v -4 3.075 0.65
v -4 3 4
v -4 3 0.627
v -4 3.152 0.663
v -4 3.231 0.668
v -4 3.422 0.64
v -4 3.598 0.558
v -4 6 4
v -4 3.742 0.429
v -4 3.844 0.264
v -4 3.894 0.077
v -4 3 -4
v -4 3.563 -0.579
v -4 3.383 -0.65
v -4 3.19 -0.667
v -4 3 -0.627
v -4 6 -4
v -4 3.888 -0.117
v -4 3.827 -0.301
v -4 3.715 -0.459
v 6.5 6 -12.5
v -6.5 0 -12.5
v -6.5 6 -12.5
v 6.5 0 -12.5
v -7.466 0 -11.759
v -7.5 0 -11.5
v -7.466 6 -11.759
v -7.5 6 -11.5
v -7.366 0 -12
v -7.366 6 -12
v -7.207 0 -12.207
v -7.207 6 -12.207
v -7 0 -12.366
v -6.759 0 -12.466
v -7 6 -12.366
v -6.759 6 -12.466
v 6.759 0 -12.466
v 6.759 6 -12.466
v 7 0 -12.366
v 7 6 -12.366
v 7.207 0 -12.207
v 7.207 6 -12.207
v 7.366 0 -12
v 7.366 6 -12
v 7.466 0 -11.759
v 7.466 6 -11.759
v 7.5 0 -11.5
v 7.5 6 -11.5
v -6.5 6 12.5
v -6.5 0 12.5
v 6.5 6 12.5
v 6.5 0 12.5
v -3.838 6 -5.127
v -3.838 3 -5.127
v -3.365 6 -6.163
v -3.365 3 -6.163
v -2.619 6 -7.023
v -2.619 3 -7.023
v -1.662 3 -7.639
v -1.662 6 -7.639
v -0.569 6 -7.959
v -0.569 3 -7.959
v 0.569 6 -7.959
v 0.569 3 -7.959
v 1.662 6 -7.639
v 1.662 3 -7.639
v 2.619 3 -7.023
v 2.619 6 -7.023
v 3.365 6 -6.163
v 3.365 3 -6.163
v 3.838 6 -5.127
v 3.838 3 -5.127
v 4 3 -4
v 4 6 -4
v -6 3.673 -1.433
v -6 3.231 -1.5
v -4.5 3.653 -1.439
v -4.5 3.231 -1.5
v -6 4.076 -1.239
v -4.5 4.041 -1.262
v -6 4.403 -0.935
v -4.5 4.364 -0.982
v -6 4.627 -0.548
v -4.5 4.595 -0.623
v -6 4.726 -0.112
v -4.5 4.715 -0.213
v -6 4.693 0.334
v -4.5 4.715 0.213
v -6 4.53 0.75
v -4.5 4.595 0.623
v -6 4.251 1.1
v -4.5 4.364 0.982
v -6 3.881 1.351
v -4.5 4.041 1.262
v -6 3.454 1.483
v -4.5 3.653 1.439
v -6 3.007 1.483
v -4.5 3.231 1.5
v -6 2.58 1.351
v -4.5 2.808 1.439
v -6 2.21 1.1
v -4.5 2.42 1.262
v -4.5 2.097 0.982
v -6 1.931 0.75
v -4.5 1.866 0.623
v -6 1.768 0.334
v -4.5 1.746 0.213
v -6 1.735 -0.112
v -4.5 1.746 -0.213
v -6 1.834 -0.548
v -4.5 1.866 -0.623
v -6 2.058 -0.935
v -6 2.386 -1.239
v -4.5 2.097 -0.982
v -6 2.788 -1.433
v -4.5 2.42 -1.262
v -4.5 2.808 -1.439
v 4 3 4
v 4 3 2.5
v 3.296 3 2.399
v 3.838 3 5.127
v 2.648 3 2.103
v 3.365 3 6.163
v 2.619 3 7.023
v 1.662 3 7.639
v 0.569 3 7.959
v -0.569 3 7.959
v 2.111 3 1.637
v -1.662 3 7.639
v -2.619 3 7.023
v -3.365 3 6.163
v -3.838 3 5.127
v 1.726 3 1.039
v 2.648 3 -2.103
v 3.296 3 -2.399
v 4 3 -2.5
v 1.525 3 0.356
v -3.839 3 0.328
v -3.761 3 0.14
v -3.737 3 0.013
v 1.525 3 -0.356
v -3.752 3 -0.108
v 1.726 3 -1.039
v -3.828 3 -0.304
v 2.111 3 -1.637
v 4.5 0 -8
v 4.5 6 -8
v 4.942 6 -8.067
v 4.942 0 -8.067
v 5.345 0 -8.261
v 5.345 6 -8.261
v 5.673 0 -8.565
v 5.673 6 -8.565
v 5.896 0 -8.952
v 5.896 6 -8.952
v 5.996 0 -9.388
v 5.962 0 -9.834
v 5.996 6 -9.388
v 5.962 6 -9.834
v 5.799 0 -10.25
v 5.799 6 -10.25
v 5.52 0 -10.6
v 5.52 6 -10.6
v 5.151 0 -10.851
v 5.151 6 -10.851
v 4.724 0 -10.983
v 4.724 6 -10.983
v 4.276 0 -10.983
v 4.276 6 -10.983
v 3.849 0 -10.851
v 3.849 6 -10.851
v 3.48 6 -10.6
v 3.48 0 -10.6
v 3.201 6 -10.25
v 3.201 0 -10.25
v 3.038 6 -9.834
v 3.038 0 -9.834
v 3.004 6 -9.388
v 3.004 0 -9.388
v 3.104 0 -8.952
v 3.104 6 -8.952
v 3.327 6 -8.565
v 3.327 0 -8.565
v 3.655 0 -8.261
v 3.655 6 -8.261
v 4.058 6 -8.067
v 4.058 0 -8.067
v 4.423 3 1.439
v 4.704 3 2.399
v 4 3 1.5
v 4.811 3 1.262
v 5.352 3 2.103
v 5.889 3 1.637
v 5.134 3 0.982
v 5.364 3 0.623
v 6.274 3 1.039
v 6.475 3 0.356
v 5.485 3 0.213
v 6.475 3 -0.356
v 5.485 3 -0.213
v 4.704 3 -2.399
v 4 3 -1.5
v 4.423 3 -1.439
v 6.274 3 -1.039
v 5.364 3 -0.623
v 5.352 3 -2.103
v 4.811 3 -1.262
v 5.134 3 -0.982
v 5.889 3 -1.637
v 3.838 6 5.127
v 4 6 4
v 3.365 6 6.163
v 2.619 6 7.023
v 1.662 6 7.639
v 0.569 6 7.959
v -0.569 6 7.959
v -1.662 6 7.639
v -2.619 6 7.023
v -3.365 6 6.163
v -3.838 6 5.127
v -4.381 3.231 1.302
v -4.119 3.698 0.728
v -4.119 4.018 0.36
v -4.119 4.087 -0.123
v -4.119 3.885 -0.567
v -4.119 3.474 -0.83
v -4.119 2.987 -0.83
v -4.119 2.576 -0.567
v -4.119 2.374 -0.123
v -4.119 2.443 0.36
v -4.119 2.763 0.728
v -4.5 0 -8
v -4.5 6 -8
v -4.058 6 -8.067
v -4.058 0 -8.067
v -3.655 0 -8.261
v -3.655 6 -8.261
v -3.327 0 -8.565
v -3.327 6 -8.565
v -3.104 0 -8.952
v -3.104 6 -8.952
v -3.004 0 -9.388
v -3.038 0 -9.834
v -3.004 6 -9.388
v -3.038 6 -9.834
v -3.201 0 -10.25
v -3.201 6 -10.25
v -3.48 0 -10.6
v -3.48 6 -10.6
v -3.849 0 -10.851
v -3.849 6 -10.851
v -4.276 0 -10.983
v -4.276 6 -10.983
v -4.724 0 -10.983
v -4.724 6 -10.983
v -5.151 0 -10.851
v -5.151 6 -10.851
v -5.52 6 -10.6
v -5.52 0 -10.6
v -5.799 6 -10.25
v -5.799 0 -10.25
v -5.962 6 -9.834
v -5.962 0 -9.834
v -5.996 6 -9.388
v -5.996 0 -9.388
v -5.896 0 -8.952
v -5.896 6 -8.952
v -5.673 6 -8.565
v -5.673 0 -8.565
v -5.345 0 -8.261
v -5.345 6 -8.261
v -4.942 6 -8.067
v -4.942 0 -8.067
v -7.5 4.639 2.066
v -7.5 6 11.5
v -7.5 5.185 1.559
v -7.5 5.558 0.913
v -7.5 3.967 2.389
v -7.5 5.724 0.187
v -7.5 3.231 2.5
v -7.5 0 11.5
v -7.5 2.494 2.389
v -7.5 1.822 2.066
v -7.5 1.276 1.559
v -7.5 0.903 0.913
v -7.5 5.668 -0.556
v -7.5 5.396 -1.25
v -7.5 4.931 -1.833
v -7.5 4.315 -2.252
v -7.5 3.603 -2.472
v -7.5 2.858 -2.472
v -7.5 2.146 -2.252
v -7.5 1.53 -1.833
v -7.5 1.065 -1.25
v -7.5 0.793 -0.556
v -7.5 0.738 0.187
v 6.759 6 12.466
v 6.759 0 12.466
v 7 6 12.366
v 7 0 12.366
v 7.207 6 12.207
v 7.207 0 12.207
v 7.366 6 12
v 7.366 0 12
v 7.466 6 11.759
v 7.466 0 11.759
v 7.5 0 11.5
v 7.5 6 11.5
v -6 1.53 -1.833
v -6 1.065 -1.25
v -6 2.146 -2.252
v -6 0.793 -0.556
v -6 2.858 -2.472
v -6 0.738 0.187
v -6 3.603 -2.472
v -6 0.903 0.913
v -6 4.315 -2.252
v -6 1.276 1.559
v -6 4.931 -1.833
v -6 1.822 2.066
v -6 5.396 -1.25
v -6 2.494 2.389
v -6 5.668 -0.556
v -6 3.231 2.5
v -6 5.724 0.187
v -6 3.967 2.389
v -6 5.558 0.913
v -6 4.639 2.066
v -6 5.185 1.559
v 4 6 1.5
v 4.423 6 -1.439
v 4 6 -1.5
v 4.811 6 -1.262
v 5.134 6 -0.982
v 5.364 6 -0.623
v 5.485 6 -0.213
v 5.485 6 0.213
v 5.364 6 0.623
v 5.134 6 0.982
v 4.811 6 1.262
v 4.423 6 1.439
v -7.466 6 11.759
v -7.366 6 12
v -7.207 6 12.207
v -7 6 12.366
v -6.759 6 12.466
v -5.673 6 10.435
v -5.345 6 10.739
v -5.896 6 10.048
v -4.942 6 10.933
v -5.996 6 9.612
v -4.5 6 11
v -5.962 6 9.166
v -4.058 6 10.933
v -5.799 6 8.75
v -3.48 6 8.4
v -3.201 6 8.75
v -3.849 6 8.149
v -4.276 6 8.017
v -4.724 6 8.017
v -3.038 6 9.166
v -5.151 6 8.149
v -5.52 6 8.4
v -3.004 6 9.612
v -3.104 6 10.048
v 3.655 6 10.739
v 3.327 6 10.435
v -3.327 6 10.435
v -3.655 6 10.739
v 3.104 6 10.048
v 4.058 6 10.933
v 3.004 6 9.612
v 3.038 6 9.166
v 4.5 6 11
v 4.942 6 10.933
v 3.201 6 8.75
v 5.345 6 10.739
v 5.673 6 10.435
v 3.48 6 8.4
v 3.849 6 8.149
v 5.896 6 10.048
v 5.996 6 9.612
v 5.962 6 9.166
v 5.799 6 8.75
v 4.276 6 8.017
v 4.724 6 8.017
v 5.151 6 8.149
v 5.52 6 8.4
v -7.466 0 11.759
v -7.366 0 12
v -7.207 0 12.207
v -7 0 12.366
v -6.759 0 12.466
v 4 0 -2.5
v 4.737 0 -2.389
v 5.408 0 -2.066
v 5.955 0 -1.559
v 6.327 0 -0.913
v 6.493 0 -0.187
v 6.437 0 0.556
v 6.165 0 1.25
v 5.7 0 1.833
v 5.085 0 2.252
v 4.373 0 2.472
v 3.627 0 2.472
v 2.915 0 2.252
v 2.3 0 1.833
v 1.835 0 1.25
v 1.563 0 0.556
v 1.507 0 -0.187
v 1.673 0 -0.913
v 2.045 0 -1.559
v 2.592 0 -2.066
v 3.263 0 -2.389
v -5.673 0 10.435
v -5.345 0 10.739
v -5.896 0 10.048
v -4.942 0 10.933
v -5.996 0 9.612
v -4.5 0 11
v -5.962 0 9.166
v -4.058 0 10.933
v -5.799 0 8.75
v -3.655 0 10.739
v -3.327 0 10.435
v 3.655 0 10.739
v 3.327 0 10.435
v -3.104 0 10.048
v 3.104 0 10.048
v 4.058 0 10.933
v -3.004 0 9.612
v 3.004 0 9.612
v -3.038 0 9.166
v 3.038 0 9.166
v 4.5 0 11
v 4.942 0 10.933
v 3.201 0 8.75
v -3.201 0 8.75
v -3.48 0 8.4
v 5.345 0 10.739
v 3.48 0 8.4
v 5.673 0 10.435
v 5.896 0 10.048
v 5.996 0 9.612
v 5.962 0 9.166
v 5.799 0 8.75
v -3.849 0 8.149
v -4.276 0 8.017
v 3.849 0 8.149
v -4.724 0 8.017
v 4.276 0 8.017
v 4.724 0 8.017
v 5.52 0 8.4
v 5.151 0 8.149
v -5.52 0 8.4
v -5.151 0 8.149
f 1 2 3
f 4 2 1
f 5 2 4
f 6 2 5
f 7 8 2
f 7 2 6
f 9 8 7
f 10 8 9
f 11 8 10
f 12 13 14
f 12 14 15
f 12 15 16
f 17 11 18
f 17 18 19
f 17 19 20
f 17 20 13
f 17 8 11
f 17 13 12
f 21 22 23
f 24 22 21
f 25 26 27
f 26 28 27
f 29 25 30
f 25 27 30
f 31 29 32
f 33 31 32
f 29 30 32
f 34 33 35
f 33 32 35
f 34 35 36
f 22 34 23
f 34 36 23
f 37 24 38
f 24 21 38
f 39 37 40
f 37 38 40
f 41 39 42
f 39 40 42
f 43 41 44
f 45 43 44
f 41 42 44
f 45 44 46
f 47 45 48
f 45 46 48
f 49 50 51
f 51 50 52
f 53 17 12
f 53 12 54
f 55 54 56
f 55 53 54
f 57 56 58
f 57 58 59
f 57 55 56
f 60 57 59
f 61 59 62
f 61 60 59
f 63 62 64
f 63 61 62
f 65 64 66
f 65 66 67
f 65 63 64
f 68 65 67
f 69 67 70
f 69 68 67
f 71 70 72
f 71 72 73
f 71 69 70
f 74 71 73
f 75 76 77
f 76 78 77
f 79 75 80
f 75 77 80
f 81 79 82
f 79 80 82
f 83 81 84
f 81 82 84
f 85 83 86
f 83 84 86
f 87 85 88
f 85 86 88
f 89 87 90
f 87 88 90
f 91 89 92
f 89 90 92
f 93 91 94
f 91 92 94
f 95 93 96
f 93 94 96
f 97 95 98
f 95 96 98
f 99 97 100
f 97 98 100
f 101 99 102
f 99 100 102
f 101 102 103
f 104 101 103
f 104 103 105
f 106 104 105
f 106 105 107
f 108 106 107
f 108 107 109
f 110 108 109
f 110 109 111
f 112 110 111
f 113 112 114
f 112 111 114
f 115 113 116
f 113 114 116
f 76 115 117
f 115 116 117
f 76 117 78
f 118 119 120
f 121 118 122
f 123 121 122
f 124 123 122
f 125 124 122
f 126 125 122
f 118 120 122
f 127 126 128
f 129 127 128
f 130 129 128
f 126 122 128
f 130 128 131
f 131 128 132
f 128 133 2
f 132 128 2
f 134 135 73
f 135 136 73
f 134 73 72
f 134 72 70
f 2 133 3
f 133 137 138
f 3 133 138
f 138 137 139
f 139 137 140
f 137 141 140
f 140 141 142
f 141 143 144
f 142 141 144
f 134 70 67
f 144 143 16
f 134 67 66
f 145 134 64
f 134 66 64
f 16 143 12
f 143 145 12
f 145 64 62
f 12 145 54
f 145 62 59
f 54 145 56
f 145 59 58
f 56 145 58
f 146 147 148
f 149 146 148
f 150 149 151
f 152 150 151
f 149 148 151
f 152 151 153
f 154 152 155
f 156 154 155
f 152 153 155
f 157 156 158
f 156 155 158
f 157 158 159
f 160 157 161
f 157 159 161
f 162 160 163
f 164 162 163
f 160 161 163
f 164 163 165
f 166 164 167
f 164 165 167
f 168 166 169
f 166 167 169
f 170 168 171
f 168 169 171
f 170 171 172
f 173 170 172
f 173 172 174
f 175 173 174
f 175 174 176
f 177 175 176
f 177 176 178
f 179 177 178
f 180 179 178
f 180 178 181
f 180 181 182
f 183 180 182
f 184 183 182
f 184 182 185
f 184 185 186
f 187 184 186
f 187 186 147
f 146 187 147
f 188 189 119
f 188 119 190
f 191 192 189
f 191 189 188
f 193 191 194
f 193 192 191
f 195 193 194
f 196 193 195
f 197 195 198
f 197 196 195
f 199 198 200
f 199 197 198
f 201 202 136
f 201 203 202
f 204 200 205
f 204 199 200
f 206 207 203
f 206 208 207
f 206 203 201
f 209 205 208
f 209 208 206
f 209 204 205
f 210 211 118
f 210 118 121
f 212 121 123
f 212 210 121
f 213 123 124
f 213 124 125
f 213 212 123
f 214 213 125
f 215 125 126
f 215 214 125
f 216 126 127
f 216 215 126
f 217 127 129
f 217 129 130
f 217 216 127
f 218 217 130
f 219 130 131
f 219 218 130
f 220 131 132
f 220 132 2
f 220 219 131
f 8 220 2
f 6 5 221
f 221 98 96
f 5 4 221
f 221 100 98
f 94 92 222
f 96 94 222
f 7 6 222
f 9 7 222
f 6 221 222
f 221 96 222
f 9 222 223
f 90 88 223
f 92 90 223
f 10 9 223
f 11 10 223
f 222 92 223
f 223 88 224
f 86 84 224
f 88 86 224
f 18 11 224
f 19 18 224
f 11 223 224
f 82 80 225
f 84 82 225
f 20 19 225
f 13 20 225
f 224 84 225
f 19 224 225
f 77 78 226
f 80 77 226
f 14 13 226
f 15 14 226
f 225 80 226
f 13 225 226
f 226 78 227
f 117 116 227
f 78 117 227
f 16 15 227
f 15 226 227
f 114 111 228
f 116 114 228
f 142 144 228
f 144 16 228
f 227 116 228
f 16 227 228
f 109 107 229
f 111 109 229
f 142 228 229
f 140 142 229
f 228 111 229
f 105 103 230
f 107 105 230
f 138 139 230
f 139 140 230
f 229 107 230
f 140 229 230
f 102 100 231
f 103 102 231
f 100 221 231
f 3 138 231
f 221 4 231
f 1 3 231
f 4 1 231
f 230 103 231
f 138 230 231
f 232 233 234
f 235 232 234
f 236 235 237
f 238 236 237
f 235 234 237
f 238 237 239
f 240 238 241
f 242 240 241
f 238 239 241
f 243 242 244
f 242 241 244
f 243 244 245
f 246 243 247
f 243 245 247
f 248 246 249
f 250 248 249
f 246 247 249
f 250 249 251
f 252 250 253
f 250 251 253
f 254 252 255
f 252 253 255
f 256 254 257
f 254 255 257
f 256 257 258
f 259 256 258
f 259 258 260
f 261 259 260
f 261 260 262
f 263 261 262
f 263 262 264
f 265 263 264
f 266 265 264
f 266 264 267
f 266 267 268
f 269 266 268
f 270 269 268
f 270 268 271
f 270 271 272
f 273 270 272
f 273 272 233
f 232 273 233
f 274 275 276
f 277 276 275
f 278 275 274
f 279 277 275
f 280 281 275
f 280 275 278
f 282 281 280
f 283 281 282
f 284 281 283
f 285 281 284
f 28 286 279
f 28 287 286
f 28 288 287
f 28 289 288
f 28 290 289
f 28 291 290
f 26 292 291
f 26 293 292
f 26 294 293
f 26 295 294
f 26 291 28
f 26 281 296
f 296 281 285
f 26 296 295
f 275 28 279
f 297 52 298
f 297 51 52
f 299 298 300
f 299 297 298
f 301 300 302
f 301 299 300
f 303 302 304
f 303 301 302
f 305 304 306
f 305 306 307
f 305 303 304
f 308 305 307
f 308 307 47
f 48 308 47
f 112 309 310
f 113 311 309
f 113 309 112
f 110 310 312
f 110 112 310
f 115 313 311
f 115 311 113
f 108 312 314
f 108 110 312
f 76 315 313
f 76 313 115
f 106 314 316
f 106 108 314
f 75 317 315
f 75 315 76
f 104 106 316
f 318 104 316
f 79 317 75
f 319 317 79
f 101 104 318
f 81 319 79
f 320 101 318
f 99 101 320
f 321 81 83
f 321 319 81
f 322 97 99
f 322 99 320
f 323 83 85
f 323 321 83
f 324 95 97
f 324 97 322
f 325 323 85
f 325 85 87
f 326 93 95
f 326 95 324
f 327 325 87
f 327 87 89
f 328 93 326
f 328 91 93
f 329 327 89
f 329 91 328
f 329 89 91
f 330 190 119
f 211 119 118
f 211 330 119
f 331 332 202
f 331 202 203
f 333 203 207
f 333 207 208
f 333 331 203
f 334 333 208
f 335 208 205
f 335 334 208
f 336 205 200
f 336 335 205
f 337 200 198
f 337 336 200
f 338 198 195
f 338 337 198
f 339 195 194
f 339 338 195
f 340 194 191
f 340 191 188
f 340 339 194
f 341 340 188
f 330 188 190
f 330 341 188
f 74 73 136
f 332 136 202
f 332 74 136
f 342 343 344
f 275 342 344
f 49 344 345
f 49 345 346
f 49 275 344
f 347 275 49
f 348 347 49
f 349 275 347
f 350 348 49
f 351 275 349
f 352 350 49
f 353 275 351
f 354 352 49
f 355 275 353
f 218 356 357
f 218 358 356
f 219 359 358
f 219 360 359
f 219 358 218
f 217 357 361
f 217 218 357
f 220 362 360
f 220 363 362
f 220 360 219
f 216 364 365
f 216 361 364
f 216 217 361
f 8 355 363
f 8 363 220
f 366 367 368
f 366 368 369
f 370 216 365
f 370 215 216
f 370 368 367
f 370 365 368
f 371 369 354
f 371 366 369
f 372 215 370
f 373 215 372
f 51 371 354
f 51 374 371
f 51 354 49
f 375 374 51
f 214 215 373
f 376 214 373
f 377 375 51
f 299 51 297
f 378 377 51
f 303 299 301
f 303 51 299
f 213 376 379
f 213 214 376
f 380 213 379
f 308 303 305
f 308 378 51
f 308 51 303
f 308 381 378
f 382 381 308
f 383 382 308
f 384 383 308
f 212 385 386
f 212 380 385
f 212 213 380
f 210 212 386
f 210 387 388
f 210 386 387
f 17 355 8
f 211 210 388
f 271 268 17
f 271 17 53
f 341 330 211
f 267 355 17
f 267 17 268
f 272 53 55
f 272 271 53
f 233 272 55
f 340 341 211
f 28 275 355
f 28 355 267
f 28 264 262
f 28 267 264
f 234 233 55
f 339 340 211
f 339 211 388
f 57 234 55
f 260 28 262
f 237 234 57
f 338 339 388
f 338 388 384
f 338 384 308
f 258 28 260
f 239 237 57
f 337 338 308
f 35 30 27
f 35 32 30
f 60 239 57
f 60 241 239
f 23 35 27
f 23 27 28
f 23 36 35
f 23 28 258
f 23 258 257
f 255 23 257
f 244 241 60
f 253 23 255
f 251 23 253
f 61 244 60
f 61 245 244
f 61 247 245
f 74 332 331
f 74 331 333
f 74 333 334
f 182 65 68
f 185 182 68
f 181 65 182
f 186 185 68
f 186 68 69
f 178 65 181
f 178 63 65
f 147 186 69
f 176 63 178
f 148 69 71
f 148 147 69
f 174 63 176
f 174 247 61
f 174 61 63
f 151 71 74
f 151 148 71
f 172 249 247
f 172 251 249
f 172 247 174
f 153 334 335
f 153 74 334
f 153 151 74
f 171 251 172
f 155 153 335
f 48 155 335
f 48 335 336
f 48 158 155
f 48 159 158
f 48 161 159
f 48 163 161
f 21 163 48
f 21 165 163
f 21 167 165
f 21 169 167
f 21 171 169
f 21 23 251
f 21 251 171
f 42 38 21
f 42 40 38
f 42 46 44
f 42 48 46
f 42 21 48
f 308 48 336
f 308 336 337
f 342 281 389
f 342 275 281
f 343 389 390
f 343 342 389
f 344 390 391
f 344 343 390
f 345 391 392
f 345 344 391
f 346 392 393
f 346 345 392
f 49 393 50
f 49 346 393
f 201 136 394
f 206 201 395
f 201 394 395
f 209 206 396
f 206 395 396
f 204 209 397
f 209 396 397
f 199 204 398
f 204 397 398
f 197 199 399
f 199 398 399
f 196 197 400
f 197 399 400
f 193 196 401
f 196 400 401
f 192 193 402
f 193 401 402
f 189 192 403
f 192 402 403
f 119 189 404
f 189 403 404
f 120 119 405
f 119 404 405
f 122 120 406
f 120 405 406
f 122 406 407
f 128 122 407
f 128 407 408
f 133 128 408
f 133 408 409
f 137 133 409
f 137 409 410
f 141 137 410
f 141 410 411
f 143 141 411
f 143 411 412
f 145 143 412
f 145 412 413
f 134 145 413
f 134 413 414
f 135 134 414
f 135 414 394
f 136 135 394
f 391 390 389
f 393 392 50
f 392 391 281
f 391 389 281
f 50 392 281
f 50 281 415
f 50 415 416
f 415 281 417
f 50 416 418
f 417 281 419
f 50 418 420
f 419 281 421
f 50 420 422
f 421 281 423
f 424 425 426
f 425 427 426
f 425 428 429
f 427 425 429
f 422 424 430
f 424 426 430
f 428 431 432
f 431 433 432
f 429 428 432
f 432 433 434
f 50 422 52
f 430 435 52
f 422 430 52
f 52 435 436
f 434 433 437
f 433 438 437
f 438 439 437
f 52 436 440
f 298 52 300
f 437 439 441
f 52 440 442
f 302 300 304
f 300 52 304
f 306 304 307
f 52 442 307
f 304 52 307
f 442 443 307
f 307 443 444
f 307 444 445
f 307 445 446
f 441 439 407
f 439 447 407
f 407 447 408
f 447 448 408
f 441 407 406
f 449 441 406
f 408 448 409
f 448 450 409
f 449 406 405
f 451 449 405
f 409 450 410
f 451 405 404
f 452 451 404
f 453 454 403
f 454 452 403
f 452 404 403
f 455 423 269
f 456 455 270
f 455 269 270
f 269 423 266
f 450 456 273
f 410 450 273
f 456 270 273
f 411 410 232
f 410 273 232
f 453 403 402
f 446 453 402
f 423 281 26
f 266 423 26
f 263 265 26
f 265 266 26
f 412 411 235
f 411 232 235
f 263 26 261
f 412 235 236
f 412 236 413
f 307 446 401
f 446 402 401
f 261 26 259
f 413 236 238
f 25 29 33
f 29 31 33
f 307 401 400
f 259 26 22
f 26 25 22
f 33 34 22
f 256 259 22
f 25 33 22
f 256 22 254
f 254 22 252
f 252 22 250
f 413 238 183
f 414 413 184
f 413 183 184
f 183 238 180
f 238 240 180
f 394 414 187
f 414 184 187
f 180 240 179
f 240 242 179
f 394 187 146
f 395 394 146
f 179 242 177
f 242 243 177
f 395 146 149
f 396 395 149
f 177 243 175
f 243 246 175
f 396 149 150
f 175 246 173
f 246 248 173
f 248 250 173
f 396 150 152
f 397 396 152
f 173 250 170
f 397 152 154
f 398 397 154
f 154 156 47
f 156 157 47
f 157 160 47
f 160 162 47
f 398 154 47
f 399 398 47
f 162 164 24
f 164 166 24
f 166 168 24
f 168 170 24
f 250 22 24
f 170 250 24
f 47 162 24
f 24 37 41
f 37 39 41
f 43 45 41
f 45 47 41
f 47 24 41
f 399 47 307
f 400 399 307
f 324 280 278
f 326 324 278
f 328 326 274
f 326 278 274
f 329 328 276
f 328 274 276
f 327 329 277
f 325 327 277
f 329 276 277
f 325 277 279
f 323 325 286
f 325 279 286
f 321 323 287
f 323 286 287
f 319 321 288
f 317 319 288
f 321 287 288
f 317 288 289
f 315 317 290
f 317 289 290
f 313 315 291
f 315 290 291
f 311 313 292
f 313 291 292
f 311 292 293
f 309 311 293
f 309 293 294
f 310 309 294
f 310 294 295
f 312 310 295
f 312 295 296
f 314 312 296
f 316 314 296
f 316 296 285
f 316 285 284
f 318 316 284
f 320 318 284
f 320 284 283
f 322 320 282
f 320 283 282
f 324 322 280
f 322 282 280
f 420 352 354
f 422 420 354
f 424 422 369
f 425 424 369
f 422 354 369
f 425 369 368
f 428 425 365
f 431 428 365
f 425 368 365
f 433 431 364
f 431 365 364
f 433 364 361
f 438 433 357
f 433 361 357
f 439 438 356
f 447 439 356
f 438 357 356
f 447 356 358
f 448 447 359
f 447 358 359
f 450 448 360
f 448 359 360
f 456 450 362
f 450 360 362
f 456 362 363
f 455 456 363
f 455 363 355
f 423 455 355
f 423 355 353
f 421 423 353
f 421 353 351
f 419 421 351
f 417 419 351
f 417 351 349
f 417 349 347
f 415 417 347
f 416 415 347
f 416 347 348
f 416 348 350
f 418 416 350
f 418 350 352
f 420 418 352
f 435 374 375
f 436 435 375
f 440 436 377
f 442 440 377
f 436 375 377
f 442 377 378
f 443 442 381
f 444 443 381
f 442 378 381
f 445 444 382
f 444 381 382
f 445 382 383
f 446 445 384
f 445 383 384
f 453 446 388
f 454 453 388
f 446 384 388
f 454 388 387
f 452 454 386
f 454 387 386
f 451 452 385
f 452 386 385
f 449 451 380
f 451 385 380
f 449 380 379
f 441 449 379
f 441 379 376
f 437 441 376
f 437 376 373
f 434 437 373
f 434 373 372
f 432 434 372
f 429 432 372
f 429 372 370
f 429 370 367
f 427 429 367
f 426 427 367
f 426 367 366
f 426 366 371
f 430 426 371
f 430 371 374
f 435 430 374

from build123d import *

# Parameters (mm, degrees)
SKETCH1_W                 = 15
SKETCH1_H                 = 25
BOSS_EXTRUDE1_DEPTH       = 6
CUT_EXTRUDE1_DEPTH        = 3
SKETCH3_R                 = 1.5
CUT_EXTRUDE2_DEPTH        = 16.76388277
SKETCH4_R                 = 2.5
CUT_EXTRUDE3_DEPTH        = 3
F_3_0MM_DOWEL_HOLE1_D     = 3
F_3_0MM_DOWEL_HOLE1_DEPTH = 3
F_3_0MM_DOWEL_HOLE1_TIP   = 0.901290929
SKETCH7_R                 = 2.5
CUT_EXTRUDE4_DEPTH        = 1.5
FILLET1_R                 = 1


with BuildPart() as part:
    # Sketch1 → Boss-Extrude1 (new body)
    with BuildSketch(Plane(origin=(0, 0, 0), x_dir=(1, 0, 0), z_dir=(0, 1, 0))):
        Rectangle(SKETCH1_W, SKETCH1_H)
    extrude(amount=BOSS_EXTRUDE1_DEPTH)

    # Sketch2 → Cut-Extrude1 (cut)
    with BuildSketch(Plane(origin=(0, 6, 0), x_dir=(1, 0, 0), z_dir=(0, 1, 0))):
        with BuildLine():
            Line((4, 4), (4, 1.5))
            ThreePointArc((4, 1.5), (5.5, 0), (4, -1.5))
            Line((4, -1.5), (4, -4))
            ThreePointArc((4, -4), (0, -8), (-4, -4))
            Line((-4, -4), (-4, 4))
            ThreePointArc((-4, 4), (0, 8), (4, 4))
        make_face()
    extrude(amount=-CUT_EXTRUDE1_DEPTH, mode=Mode.SUBTRACT)

    # Sketch3 → Cut-Extrude2 (cut, through all)
    with BuildSketch(Plane(origin=(0, 6, 0), x_dir=(1, 0, 0), z_dir=(0, 1, 0))):
        with Locations(Location((-4.5, 9.5, 0), (0, 0, 270))):
            Circle(SKETCH3_R)
        with Locations(Location((4.5, 9.5, 0), (0, 0, 270))):
            Circle(SKETCH3_R)
        with Locations(Location((-4.5, -9.5, 0), (0, 0, 270))):
            Circle(SKETCH3_R)
        with Locations(Location((4.5, -9.5, 0), (0, 0, 270))):
            Circle(SKETCH3_R)
    extrude(amount=-CUT_EXTRUDE2_DEPTH, mode=Mode.SUBTRACT)

    # Sketch4 → Cut-Extrude3 (cut)
    with BuildSketch(Plane.XZ):
        with Locations(Location((4, 0, 0), (0, 0, 270))):
            Circle(SKETCH4_R)
    extrude(amount=-CUT_EXTRUDE3_DEPTH, mode=Mode.SUBTRACT)

    # Ø3.0mm Dowel Hole1
    with Locations(Plane.ZY.offset(7.5)):
        with Locations((0, 3.230523086)):
            Hole(F_3_0MM_DOWEL_HOLE1_D / 2, depth=F_3_0MM_DOWEL_HOLE1_DEPTH)
            with Locations((0, 0, -(F_3_0MM_DOWEL_HOLE1_DEPTH + F_3_0MM_DOWEL_HOLE1_TIP / 2))):  # 118° drill point
                Cone(0, F_3_0MM_DOWEL_HOLE1_D / 2, F_3_0MM_DOWEL_HOLE1_TIP, mode=Mode.SUBTRACT)

    # Sketch7 → Cut-Extrude4 (cut)
    with BuildSketch(Plane.ZY.offset(7.5)):
        with Locations((0, 3.230523086)):
            Circle(SKETCH7_R)
    extrude(amount=-CUT_EXTRUDE4_DEPTH, mode=Mode.SUBTRACT)

    # Fillet1
    fillet1_edges = [part.edges().sort_by_distance(p)[0] for p in [
        (7.5, 3, 12.5),
        (-7.5, 3, 12.5),
        (-7.5, 3, -12.5),
        (7.5, 3, -12.5),
    ]]
    fillet(fillet1_edges, radius=FILLET1_R)


solid = part.part
